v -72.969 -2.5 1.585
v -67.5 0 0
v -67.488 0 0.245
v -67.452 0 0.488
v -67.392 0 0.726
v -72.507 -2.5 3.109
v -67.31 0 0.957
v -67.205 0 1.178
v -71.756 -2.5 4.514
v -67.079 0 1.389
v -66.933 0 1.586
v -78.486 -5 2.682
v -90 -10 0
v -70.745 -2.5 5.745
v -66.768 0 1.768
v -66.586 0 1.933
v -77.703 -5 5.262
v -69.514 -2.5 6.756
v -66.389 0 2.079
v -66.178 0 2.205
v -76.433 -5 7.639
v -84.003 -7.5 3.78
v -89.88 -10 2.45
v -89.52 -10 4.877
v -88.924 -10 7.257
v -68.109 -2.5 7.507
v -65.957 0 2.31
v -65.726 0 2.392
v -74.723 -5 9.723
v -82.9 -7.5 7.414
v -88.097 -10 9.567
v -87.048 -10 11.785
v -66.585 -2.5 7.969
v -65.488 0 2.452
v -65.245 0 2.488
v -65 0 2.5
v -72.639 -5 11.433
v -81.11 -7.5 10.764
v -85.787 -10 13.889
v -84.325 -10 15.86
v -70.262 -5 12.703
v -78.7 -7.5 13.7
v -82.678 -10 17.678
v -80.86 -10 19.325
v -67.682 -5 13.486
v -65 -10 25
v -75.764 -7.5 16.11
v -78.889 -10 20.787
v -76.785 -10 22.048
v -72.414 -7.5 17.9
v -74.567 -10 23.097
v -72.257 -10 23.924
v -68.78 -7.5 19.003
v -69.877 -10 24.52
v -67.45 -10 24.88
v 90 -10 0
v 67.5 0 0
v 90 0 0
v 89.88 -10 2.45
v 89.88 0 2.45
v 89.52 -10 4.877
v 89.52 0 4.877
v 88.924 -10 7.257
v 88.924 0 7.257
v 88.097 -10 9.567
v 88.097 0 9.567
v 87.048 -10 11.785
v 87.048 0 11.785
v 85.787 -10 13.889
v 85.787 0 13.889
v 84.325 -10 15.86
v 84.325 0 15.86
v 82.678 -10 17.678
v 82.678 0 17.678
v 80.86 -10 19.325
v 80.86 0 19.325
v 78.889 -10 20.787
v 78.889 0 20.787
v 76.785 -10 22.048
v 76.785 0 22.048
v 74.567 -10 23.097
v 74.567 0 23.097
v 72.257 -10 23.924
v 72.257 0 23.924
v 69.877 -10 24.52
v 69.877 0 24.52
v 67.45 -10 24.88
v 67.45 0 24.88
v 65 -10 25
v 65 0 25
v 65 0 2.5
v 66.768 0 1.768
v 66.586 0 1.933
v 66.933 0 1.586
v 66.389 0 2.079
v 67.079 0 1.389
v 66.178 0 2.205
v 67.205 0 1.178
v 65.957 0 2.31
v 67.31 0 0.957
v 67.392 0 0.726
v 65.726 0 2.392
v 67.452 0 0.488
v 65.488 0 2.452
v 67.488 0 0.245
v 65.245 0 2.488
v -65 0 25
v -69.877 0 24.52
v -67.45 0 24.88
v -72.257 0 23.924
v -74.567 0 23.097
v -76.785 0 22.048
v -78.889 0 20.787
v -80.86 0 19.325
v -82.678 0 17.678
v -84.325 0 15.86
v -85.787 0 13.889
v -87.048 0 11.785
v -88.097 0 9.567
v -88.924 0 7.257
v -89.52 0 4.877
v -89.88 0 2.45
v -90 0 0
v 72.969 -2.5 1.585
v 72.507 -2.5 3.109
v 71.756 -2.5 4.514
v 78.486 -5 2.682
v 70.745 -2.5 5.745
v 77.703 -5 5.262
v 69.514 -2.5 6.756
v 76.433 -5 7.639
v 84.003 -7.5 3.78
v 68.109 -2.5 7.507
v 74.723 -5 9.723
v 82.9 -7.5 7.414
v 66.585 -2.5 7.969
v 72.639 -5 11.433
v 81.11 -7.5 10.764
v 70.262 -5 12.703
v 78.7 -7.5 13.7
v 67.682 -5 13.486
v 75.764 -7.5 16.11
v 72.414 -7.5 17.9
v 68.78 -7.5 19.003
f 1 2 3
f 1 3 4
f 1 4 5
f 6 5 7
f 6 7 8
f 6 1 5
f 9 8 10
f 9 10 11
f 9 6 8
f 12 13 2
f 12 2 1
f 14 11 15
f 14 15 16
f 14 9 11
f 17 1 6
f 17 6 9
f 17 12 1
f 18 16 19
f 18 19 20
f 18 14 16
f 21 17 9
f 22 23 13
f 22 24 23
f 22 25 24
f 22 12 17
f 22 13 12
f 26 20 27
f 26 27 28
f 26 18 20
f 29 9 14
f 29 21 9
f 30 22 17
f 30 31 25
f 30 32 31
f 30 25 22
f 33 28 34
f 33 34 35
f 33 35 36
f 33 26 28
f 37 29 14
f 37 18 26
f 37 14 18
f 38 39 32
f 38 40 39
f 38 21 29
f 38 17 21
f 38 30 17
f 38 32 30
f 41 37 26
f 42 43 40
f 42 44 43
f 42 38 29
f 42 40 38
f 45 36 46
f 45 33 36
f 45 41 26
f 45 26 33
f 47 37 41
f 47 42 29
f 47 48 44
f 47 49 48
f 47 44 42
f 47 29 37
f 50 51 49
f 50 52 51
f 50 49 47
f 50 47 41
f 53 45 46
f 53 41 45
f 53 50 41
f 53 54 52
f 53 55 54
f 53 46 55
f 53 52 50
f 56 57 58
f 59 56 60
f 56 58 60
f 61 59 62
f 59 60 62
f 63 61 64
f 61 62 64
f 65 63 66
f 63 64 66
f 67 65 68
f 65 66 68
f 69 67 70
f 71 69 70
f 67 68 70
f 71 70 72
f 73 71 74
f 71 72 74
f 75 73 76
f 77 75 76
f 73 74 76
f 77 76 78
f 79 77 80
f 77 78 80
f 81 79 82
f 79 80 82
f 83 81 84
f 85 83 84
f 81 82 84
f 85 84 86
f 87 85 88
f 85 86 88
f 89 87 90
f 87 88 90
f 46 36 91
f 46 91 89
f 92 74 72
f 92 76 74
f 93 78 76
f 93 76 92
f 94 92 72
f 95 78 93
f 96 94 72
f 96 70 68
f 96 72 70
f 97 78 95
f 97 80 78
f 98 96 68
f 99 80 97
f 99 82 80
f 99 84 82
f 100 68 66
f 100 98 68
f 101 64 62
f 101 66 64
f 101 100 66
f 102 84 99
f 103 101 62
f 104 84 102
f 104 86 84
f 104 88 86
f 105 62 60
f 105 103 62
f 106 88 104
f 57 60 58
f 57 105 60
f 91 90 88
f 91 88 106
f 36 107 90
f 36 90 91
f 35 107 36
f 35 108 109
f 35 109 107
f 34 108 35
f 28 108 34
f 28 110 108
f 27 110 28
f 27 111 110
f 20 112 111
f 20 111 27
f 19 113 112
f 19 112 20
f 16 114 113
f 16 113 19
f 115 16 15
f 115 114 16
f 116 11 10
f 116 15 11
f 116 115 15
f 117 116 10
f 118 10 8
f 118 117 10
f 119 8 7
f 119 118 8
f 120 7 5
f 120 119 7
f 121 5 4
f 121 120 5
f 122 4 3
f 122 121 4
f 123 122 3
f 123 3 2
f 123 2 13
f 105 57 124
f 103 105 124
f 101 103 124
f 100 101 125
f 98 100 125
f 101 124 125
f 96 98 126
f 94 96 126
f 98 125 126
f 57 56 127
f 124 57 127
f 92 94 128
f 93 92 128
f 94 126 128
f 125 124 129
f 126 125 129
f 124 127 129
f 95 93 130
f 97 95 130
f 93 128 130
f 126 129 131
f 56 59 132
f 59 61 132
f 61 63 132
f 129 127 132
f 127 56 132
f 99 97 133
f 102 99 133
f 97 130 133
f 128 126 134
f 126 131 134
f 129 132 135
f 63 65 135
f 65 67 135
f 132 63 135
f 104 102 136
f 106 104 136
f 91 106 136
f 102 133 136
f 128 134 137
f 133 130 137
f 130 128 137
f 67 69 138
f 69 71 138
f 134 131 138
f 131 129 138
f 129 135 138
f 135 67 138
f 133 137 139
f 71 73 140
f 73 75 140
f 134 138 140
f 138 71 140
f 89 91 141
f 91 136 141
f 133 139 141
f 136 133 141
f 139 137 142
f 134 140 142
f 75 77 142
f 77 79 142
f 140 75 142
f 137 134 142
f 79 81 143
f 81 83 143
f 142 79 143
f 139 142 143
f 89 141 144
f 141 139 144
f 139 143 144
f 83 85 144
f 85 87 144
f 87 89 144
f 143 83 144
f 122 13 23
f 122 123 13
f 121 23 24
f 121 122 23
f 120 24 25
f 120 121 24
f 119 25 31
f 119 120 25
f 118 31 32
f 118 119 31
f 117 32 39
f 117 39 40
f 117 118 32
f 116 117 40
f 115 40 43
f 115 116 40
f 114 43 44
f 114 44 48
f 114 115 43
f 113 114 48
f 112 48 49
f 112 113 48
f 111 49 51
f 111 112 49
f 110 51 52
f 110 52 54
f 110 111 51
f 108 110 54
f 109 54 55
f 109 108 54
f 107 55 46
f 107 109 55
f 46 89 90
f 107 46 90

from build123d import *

# Parameters (mm, degrees)
F2_ANGLE = 90
F3_DEPTH = 65


with BuildPart() as f2:
    # F1 (on Top) → F2 (revolve)
    with BuildSketch(Plane.XY):
        Polygon((90, -10), (90, 0), (67.5, 0), align=None)
    revolve(axis=Axis((65, 13.2645983249, 0), (0, -1, 0)), revolution_arc=F2_ANGLE)

    # F3 (add): a face of the model
    f3_faces = [f2.faces().sort_by_distance(p)[0] for p in [
        (65, -3.3333333333, 17.5),
    ]]
    extrude(f3_faces, amount=F3_DEPTH)

    # F4: F2 across plane


with BuildPart() as f2_1:
    add(f2.part)
    add(f2.part.mirror(Plane.YZ))


solid = f2_1.part
